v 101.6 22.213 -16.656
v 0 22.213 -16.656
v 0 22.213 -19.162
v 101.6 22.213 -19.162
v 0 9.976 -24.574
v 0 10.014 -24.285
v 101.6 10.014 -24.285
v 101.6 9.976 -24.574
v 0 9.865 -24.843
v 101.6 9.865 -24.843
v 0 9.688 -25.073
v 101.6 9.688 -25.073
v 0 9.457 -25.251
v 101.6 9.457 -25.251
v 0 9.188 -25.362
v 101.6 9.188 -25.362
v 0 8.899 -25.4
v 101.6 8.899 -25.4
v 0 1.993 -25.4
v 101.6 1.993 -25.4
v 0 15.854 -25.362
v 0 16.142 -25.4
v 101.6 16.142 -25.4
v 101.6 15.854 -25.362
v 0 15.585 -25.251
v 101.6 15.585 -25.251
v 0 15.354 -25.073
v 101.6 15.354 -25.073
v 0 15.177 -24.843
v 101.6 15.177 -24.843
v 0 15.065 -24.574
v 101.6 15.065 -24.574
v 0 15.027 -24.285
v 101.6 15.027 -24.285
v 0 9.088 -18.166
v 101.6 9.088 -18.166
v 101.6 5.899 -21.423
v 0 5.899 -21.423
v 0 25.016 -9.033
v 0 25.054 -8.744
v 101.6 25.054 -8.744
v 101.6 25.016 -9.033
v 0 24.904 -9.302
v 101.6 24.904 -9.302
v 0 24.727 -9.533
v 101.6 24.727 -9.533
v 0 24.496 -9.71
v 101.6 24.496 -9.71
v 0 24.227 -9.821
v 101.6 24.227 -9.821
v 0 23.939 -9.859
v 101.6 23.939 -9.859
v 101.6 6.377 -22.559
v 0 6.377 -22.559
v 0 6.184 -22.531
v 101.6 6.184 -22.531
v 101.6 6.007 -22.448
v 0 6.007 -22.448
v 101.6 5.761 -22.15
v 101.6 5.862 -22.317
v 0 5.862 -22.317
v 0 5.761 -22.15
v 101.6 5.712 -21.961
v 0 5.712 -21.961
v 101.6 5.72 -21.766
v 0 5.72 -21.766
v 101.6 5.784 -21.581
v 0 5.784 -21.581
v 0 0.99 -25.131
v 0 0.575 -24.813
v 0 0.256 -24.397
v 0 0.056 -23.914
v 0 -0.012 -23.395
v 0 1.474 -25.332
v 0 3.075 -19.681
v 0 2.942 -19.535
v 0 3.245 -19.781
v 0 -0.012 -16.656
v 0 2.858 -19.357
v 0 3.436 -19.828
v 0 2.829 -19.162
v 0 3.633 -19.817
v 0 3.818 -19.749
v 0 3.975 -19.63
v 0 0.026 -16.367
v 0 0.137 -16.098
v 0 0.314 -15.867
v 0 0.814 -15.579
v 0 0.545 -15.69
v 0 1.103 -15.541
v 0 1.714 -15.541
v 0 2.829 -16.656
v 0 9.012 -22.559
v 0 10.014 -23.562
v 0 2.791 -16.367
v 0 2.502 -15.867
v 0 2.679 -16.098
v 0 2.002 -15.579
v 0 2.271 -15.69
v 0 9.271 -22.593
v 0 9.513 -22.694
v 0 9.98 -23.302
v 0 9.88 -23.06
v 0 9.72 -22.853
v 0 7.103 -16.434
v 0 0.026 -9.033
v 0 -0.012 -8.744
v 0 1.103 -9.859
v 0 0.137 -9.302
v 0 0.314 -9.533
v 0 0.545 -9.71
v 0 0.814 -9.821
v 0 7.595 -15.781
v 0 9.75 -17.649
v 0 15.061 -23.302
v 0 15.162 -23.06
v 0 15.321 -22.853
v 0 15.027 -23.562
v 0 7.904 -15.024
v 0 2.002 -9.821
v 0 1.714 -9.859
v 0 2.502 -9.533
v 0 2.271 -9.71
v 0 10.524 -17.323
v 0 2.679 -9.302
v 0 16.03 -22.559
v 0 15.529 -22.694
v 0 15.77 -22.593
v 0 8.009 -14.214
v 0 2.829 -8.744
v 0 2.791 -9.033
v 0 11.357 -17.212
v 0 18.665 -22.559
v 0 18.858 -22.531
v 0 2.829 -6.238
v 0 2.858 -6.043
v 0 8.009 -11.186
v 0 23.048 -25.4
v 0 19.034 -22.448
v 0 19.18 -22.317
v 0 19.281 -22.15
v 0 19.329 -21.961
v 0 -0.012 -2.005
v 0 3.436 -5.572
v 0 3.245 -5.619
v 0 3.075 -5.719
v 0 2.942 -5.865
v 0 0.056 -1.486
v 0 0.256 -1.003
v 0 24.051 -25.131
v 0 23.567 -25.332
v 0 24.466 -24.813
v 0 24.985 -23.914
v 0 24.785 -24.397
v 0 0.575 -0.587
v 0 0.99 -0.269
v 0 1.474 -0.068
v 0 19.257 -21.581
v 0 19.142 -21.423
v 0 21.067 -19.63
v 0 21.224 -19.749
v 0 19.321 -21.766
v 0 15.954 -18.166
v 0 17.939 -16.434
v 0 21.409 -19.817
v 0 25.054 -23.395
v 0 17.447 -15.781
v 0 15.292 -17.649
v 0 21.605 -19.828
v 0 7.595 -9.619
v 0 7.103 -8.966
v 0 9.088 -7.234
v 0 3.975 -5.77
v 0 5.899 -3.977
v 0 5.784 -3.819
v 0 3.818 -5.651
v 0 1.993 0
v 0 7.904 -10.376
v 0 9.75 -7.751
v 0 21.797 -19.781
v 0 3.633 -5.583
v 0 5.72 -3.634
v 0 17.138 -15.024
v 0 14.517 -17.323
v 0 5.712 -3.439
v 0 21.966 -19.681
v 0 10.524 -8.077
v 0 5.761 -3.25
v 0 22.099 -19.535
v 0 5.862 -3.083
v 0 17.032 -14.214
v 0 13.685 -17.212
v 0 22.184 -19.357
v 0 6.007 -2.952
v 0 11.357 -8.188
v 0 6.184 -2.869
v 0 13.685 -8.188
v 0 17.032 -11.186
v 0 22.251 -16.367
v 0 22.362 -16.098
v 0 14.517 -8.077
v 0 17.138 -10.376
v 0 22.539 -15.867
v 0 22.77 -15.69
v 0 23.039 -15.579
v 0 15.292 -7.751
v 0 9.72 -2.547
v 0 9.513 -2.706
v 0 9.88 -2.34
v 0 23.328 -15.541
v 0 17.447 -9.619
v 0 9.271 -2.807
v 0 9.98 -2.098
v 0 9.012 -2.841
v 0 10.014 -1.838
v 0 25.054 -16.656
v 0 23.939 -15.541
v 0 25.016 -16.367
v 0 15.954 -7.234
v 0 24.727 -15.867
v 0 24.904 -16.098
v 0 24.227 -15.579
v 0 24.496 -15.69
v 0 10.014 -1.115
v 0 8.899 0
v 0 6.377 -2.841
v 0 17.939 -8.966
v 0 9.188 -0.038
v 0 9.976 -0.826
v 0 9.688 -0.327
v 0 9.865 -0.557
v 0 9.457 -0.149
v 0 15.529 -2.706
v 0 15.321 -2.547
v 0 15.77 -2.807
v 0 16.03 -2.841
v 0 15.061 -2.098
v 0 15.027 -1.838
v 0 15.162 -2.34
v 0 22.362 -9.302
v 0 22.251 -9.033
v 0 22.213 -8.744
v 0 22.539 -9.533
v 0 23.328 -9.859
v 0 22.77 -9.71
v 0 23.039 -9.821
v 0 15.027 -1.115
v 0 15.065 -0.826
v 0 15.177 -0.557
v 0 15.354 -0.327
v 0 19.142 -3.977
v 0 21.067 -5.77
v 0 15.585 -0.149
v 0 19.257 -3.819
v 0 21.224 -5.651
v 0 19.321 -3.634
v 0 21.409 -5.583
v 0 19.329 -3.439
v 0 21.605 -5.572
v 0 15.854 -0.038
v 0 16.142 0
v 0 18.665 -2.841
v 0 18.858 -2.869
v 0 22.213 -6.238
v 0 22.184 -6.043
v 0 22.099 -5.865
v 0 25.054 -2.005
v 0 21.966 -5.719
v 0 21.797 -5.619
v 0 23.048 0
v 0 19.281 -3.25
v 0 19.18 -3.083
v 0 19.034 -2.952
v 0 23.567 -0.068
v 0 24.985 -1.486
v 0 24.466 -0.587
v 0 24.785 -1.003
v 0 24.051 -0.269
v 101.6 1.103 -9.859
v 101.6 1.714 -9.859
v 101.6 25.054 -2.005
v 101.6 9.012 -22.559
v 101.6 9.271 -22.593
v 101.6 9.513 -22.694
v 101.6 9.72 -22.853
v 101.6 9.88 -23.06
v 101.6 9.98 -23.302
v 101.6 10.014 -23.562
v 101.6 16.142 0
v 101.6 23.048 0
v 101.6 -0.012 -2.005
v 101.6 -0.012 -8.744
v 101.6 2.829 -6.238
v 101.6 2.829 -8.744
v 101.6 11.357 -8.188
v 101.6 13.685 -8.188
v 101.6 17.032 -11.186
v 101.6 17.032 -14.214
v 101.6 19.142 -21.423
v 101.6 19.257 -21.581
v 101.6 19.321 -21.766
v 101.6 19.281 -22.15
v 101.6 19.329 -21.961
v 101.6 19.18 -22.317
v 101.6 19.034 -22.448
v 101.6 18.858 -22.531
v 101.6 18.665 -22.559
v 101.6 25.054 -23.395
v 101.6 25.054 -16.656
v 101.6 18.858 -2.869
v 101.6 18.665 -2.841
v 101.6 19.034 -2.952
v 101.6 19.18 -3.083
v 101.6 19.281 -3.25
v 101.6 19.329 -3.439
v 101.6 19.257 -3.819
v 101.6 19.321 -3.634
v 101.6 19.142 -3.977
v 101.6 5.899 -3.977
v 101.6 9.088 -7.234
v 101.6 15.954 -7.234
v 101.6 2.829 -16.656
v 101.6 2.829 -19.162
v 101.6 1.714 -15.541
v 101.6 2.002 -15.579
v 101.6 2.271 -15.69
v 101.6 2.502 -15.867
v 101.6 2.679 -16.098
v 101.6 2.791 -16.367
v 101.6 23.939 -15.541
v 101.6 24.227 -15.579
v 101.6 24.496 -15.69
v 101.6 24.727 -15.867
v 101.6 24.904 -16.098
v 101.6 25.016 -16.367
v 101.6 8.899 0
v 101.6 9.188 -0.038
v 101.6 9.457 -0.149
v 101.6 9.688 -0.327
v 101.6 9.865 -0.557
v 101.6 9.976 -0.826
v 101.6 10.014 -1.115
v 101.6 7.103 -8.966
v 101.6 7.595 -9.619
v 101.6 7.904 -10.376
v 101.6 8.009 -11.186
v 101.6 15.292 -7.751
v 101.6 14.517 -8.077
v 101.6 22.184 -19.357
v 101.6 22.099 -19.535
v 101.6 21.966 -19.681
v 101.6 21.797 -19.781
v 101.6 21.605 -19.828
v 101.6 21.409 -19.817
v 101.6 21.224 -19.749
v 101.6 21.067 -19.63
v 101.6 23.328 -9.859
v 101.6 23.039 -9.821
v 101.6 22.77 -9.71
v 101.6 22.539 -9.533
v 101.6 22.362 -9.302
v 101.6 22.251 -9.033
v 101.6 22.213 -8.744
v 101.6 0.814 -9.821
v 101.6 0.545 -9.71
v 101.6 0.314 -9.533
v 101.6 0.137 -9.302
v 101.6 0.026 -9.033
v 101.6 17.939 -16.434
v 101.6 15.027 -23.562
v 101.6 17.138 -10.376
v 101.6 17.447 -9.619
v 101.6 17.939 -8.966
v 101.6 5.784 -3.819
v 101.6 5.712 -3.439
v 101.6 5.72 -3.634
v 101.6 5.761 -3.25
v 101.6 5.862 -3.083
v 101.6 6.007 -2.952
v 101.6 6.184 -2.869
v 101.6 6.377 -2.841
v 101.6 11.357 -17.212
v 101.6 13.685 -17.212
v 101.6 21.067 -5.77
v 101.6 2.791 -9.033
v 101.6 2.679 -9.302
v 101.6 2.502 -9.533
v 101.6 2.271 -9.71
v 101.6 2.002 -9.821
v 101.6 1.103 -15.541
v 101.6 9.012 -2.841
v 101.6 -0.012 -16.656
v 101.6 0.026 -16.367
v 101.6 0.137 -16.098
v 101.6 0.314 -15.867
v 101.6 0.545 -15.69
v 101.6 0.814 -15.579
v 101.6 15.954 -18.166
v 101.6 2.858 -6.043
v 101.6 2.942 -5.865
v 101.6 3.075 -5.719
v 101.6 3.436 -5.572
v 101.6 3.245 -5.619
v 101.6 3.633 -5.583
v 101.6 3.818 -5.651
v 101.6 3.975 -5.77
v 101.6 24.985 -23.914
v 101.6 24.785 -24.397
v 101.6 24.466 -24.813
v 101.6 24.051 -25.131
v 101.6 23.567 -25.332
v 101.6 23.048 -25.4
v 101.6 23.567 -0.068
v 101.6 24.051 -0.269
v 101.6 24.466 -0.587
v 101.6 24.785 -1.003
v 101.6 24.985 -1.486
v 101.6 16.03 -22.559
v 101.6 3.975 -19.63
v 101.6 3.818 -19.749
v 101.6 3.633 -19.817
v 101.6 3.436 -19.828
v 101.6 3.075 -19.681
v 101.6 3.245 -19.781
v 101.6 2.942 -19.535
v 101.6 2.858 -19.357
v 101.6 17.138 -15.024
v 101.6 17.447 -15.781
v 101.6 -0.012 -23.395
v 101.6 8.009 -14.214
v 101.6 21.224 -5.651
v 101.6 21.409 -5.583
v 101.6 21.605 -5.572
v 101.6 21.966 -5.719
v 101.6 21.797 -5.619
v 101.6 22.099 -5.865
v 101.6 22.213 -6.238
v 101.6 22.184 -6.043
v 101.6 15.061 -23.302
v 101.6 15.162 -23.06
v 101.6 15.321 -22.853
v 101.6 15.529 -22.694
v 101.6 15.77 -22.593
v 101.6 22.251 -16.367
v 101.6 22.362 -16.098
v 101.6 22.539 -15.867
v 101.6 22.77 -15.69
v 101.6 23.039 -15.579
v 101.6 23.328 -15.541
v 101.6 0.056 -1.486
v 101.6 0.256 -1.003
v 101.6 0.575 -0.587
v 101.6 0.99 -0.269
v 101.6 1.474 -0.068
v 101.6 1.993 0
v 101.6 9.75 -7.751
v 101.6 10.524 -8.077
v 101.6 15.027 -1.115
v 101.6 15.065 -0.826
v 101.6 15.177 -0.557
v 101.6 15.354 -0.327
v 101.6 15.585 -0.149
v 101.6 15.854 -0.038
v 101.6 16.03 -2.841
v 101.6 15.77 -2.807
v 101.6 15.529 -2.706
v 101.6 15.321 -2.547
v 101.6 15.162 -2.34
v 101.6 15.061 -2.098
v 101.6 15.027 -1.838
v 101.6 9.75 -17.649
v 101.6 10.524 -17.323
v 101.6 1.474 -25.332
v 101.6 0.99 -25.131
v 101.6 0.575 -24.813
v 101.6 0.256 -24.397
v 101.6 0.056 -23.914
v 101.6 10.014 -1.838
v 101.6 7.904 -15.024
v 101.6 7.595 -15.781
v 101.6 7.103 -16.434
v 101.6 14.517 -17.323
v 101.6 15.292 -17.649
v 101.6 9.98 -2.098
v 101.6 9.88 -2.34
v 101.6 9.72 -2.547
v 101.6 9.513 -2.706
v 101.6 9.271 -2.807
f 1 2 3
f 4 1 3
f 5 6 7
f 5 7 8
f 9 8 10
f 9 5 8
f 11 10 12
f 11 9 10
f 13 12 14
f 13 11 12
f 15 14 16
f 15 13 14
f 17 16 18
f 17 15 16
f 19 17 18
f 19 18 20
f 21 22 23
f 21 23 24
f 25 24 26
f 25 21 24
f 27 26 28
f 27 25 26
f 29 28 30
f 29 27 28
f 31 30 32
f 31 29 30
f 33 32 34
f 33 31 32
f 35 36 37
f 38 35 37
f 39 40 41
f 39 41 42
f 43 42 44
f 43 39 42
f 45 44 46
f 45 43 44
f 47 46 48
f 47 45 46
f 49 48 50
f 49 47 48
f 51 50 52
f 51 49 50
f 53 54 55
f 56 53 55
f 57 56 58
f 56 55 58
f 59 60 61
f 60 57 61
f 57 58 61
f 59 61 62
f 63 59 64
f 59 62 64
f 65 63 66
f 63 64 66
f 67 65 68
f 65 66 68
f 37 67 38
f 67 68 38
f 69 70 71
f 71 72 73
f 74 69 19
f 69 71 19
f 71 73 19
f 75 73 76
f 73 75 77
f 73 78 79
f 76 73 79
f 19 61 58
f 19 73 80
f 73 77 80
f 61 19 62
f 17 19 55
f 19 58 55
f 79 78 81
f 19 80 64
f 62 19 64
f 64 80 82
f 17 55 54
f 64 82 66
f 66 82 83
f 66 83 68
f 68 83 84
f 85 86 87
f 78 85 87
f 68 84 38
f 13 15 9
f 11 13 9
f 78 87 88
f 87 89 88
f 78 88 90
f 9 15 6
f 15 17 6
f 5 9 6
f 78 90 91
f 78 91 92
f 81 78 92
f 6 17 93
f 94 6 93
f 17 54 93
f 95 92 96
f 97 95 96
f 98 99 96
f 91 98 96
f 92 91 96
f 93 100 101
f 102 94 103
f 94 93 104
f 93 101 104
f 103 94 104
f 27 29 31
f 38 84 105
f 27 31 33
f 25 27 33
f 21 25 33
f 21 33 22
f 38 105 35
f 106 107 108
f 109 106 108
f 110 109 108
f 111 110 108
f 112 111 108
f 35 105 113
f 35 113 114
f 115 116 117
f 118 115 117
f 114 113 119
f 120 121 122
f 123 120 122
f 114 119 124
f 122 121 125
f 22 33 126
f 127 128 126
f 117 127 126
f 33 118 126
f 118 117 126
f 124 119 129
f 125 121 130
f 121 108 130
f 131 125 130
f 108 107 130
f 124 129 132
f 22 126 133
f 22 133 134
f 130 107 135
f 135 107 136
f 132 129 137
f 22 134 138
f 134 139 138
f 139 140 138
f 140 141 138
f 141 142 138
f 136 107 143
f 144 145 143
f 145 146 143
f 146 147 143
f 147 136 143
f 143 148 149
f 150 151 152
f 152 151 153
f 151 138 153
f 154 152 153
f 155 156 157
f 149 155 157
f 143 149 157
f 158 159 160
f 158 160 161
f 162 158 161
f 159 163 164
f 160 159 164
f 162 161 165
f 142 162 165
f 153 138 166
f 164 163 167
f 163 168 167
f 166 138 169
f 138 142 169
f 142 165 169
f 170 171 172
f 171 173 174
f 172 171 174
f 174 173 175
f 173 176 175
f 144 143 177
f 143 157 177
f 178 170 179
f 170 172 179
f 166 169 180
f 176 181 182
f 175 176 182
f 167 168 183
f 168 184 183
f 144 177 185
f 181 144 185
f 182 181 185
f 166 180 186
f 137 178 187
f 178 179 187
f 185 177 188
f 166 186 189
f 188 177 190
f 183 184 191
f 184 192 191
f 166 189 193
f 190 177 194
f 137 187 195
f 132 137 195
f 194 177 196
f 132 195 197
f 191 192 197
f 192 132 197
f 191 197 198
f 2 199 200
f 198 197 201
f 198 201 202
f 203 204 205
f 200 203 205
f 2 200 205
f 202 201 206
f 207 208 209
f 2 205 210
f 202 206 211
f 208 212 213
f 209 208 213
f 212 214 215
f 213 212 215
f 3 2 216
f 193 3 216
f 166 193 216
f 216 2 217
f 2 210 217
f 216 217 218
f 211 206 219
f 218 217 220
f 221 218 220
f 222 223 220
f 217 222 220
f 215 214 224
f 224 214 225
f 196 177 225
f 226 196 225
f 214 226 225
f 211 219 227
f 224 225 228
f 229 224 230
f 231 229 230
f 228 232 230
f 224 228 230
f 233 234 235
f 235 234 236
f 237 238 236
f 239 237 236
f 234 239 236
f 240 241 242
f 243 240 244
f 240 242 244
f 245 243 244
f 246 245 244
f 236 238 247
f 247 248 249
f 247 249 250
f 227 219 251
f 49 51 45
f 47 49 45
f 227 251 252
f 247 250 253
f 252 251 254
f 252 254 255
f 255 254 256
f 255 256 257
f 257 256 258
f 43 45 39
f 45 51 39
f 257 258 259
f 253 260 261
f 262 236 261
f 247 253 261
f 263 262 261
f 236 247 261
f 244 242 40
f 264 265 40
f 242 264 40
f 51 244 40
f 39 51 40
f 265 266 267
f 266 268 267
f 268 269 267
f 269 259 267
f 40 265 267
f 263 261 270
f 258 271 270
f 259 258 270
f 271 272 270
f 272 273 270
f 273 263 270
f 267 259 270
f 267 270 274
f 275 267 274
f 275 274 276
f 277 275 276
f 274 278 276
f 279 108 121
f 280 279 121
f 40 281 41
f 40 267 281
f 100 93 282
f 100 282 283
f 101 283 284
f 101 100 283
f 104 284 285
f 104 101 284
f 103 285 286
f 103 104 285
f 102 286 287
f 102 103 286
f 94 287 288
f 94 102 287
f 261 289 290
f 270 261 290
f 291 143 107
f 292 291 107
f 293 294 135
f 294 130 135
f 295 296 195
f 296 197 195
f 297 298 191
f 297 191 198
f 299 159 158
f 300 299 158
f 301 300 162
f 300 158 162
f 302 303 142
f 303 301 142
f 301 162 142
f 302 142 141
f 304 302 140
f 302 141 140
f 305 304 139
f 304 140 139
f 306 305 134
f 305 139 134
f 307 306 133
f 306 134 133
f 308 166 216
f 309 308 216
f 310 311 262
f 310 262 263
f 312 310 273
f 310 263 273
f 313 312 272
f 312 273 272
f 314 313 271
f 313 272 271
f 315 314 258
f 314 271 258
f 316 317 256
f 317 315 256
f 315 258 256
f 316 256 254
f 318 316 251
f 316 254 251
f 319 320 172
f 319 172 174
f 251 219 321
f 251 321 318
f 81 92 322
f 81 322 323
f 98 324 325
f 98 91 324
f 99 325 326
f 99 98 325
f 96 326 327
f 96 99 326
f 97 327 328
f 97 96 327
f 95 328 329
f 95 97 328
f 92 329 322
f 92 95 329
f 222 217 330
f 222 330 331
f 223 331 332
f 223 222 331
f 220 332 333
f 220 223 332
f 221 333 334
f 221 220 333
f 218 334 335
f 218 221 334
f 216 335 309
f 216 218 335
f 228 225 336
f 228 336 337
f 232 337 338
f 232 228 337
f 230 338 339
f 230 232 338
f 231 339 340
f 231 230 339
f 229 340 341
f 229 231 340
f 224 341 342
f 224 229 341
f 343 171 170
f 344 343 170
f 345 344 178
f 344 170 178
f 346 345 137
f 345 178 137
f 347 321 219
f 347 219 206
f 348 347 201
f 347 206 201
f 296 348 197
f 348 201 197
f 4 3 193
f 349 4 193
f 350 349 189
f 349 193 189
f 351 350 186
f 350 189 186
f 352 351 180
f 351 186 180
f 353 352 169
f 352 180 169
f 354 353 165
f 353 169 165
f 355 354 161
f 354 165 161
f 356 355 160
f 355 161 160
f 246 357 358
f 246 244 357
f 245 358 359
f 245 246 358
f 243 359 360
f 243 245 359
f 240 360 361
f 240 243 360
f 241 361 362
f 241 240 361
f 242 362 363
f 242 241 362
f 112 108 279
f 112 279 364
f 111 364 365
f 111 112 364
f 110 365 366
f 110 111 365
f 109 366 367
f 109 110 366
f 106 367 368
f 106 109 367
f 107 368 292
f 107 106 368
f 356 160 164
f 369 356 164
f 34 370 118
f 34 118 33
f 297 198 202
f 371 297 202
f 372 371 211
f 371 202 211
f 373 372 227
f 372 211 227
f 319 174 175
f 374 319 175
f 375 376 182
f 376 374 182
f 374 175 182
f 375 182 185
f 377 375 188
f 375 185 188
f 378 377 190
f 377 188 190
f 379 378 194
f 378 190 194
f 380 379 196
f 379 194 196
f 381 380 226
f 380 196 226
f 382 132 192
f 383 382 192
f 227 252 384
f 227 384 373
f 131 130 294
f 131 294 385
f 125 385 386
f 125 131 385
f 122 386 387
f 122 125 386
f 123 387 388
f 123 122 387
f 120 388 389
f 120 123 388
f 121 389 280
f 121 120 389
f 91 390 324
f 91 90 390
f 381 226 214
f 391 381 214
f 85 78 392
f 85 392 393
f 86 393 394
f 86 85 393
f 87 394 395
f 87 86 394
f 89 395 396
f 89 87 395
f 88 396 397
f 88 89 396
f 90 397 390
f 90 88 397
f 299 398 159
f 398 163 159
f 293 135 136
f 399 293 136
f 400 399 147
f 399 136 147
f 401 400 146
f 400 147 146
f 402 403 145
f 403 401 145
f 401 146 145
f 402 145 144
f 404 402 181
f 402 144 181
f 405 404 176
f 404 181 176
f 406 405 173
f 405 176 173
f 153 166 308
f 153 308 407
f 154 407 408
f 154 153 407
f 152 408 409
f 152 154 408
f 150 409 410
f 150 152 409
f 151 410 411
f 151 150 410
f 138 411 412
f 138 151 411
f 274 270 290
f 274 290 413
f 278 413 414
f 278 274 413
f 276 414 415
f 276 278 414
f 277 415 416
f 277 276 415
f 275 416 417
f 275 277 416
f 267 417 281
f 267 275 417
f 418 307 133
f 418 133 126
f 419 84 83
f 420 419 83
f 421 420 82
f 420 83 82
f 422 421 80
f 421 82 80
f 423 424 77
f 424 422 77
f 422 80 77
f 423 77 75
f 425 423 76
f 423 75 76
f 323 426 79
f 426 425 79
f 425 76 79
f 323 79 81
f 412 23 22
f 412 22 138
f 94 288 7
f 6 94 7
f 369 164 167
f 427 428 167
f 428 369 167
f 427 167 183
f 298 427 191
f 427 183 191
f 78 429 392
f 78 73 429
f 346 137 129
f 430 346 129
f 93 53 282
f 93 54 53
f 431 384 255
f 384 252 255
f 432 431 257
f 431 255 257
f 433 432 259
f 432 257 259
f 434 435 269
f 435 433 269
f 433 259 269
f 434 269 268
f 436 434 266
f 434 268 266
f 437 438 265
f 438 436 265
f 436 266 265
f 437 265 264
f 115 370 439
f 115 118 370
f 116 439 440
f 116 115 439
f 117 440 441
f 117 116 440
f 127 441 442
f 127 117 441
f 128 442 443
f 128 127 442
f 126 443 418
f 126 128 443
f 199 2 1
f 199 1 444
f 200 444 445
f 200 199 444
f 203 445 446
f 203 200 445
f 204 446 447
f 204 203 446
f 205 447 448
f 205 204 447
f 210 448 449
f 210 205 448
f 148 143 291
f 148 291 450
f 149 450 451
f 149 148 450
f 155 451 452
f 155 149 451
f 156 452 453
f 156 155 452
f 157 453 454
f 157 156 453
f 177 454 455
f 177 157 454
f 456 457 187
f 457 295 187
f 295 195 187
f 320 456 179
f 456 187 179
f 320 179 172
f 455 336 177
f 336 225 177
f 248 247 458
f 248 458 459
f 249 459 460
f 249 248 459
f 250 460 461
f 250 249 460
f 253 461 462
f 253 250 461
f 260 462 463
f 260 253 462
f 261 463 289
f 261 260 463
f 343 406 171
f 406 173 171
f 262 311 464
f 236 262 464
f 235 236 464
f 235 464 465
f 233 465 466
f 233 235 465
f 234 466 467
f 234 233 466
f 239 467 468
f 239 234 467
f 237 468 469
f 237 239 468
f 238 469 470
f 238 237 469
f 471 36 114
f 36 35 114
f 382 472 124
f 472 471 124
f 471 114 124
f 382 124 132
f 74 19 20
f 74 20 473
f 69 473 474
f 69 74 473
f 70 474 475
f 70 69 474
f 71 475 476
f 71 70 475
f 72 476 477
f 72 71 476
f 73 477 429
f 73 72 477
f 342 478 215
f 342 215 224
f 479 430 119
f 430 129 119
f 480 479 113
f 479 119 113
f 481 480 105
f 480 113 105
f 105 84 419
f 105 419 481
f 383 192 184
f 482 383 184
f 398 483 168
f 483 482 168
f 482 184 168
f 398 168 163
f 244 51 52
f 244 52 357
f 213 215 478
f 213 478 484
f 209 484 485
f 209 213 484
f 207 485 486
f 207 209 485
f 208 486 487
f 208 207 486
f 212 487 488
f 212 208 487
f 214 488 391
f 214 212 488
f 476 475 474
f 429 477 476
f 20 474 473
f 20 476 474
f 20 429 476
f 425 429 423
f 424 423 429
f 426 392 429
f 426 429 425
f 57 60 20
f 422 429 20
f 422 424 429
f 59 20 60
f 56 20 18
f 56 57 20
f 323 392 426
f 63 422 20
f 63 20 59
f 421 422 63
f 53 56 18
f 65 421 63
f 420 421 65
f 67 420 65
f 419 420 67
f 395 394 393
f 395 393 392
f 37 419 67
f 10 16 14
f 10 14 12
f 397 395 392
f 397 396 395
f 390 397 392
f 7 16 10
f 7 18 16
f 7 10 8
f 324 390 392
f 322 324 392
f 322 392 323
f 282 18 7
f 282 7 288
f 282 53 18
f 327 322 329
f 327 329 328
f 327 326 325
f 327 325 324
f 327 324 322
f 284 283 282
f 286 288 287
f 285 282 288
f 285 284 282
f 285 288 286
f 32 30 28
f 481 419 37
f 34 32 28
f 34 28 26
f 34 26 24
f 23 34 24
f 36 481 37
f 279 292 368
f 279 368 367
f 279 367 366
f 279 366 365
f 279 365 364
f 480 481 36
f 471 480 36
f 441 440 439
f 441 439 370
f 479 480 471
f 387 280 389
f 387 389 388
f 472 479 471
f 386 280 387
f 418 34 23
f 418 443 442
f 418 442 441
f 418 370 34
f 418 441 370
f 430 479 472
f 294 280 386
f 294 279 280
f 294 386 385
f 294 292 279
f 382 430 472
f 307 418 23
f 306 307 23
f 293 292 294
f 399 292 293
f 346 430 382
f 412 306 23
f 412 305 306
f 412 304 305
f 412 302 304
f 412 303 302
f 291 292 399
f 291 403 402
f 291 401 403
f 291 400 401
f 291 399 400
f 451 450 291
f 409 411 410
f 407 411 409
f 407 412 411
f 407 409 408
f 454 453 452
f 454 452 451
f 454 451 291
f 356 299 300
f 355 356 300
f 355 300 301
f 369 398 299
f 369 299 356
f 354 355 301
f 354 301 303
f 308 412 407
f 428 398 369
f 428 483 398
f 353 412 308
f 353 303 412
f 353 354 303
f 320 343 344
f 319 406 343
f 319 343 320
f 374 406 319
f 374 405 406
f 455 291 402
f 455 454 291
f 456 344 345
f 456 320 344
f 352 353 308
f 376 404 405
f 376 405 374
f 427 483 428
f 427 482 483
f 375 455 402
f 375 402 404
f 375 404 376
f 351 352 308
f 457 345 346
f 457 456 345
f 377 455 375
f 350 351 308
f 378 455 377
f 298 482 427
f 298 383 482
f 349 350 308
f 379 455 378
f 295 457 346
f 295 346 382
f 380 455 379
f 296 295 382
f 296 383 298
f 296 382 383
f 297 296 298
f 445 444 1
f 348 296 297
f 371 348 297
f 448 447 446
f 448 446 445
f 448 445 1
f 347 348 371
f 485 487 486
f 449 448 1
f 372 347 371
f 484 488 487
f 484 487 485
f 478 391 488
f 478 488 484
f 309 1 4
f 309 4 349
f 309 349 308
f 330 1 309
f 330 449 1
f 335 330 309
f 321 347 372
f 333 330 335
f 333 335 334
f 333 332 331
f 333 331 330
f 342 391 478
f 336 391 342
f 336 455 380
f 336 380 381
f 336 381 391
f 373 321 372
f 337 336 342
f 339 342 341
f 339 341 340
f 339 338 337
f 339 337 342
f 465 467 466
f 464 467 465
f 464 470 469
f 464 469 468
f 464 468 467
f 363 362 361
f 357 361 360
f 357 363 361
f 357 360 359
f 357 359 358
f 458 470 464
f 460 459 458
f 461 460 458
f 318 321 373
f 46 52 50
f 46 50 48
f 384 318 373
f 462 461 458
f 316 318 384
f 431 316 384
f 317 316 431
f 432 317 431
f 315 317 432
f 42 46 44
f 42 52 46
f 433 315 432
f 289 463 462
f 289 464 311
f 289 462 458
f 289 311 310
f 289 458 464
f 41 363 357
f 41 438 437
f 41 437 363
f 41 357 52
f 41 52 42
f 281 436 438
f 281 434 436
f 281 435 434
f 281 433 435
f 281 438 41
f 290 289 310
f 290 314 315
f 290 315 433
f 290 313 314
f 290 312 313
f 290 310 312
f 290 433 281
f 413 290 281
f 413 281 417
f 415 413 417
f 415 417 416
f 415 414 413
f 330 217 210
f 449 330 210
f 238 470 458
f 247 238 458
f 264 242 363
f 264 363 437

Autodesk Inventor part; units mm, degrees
ref_plane "YZ Plane" through (0, 0, 0) normal (1, 0, 0) x (0, 1, 0)
ref_plane "XZ Plane" through (0, 0, 0) normal (0, 1, 0) x (-1, 0, 0)
ref_plane "XY Plane" through (0, 0, 0) normal (0, 0, 1) x (1, 0, 0)
sketch "Sketch1" plane through (0, 0, 0) normal (1, 0, 0) x (0, 1, 0)
  arc A0 (19.1422, -3.9768) -> (18.6646, -2.8408) centre (18.6646, -3.5092) ccw
  line L0 (15.9535, -7.2342) -> (19.1422, -3.9768)
  line L1 (21.0667, -5.7702) -> (17.9387, -8.9655)
  arc A1 (22.2128, -6.2377) -> (21.0667, -5.7702) centre (21.5444, -6.2377) ccw
  line L2 (25.0536, -2.0053) -> (25.0536, -8.7443)
  line L3 (22.2128, -8.7443) -> (22.2128, -6.2377)
  line L4 (-0.0122, -2.0053) -> (-0.0122, -8.7443)
  arc A2 (3.9747, -5.7702) -> (2.8286, -6.2377) centre (3.497, -6.2377) ccw
  arc A3 (1.9931, 0) -> (-0.0122, -2.0053) centre (1.9931, -2.0053) ccw
  line L5 (8.8992, 0) -> (1.9931, 0)
  arc A4 (7.1027, -16.4345) -> (8.0089, -14.2135) centre (4.8339, -14.2135) ccw
  arc A5 (18.6646, -22.5592) -> (19.1422, -21.4232) centre (18.6646, -21.8908) ccw
  line L6 (15.9535, -18.1658) -> (19.1422, -21.4232)
  arc A6 (21.0667, -19.6298) -> (22.2128, -19.1623) centre (21.5444, -19.1623) ccw
  line L7 (21.0667, -19.6298) -> (17.9387, -16.4345)
  line L8 (22.2128, -16.6557) -> (22.2128, -19.1623)
  line L9 (25.0536, -23.3947) -> (25.0536, -16.6557)
  line L10 (16.1422, 0) -> (23.0483, 0)
  line L11 (18.6646, -2.8408) -> (16.0299, -2.8408)
  arc A7 (22.2128, -8.7443) -> (23.3277, -9.8592) centre (23.3277, -8.7443) ccw
  line L12 (23.9387, -9.8592) -> (23.3277, -9.8592)
  arc A8 (23.9387, -9.8592) -> (25.0536, -8.7443) centre (23.9387, -8.7443) ccw
  arc A9 (6.3768, -2.8408) -> (5.8991, -3.9768) centre (6.3768, -3.5092) ccw
  line L13 (3.9747, -5.7702) -> (7.1027, -8.9655)
  line L14 (9.0879, -7.2342) -> (5.8991, -3.9768)
  arc A10 (2.8286, -19.1623) -> (3.9747, -19.6298) centre (3.497, -19.1623) ccw
  line L15 (-0.0122, -23.3947) -> (-0.0122, -16.6557)
  line L16 (3.9747, -19.6298) -> (7.1027, -16.4345)
  arc A11 (5.8991, -21.4232) -> (6.3768, -22.5592) centre (6.3768, -21.8908) ccw
  line L17 (9.0879, -18.1658) -> (5.8991, -21.4232)
  line L18 (2.8286, -16.6557) -> (2.8286, -19.1623)
  arc A12 (23.0483, -25.4) -> (25.0536, -23.3947) centre (23.0483, -23.3947) ccw
  arc A13 (25.0536, -2.0053) -> (23.0483, 0) centre (23.0483, -2.0053) ccw
  arc A14 (13.6846, -8.1882) -> (15.9535, -7.2342) centre (13.6846, -5.0132) ccw
  line L19 (13.6846, -8.1882) -> (11.3567, -8.1882)
  arc A15 (9.0115, -2.8408) -> (10.0141, -1.8382) centre (9.0115, -1.8382) ccw
  arc A16 (9.0879, -7.2342) -> (11.3567, -8.1882) centre (11.3567, -5.0132) ccw
  arc A17 (17.9387, -8.9655) -> (17.0325, -11.1865) centre (20.2075, -11.1865) ccw
  line L20 (17.0325, -14.2135) -> (17.0325, -11.1865)
  line L21 (6.3768, -2.8408) -> (9.0115, -2.8408)
  line L22 (10.0141, -1.8382) -> (10.0141, -1.1149)
  arc A18 (10.0141, -1.1149) -> (8.8992, 0) centre (8.8992, -1.1149) ccw
  line L23 (2.8286, -8.7443) -> (2.8286, -6.2377)
  arc A19 (1.7137, -9.8592) -> (2.8286, -8.7443) centre (1.7137, -8.7443) ccw
  line L24 (1.1027, -9.8592) -> (1.7137, -9.8592)
  arc A20 (-0.0122, -8.7443) -> (1.1027, -9.8592) centre (1.1027, -8.7443) ccw
  line L25 (6.3768, -22.5592) -> (9.0115, -22.5592)
  arc A21 (10.0141, -23.5618) -> (9.0115, -22.5592) centre (9.0115, -23.5618) ccw
  line L26 (10.0141, -23.5618) -> (10.0141, -24.2851)
  arc A22 (8.8992, -25.4) -> (10.0141, -24.2851) centre (8.8992, -24.2851) ccw
  line L27 (8.8992, -25.4) -> (1.9931, -25.4)
  arc A23 (17.0325, -14.2135) -> (17.9387, -16.4345) centre (20.2075, -14.2135) ccw
  line L28 (23.9387, -15.5408) -> (23.3277, -15.5408)
  arc A24 (23.3277, -15.5408) -> (22.2128, -16.6557) centre (23.3277, -16.6557) ccw
  arc A25 (25.0536, -16.6557) -> (23.9387, -15.5408) centre (23.9387, -16.6557) ccw
  line L29 (16.1422, -25.4) -> (23.0483, -25.4)
  line L30 (18.6646, -22.5592) -> (16.0299, -22.5592)
  line L31 (8.0089, -11.1865) -> (8.0089, -14.2135)
  arc A26 (8.0089, -11.1865) -> (7.1027, -8.9655) centre (4.8339, -11.1865) ccw
  arc A27 (15.0273, -1.8382) -> (16.0299, -2.8408) centre (16.0299, -1.8382) ccw
  line L32 (15.0273, -1.8382) -> (15.0273, -1.1149)
  arc A28 (16.1422, 0) -> (15.0273, -1.1149) centre (16.1422, -1.1149) ccw
  arc A29 (-0.0122, -23.3947) -> (1.9931, -25.4) centre (1.9931, -23.3947) ccw
  arc A30 (11.3567, -17.2118) -> (9.0879, -18.1658) centre (11.3567, -20.3868) ccw
  line L33 (11.3567, -17.2118) -> (13.6846, -17.2118)
  arc A31 (15.9535, -18.1658) -> (13.6846, -17.2118) centre (13.6846, -20.3868) ccw
  arc A32 (16.0299, -22.5592) -> (15.0273, -23.5618) centre (16.0299, -23.5618) ccw
  line L34 (15.0273, -23.5618) -> (15.0273, -24.2851)
  arc A33 (15.0273, -24.2851) -> (16.1422, -25.4) centre (16.1422, -24.2851) ccw
  line L35 (1.1027, -15.5408) -> (1.7137, -15.5408)
  arc A34 (1.1027, -15.5408) -> (-0.0122, -16.6557) centre (1.1027, -16.6557) ccw
  arc A35 (2.8286, -16.6557) -> (1.7137, -15.5408) centre (1.7137, -16.6557) ccw
  point P0 (0, 0)
  point P1 (12.5207, -12.7)
  dimension "d0" = 25.4
extrude "Extrusion1" add sketch "Sketch1" along normal blind 101.6
properties part number "extruded aluminum"
